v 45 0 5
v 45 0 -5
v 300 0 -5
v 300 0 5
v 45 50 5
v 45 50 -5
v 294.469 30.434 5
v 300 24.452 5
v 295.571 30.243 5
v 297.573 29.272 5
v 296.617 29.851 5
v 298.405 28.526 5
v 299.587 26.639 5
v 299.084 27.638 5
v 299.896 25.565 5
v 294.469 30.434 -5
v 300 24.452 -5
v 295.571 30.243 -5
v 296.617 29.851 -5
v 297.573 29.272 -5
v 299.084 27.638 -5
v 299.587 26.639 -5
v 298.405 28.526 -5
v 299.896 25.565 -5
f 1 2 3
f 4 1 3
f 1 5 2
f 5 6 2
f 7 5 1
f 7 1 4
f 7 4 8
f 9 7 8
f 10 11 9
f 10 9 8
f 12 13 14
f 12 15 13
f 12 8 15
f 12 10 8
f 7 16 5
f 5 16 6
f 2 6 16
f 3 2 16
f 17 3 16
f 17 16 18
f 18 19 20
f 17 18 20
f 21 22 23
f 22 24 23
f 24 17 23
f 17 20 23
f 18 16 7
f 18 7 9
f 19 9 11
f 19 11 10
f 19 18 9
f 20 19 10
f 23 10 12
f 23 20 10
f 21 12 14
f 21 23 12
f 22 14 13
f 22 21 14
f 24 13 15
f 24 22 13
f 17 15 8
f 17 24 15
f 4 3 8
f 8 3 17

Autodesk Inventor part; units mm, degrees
ref_plane "YZ Plane" through (0, 0, 0) normal (1, 0, 0) x (0, 1, 0)
ref_plane "XZ Plane" through (0, 0, 0) normal (0, 1, 0) x (-1, 0, 0)
ref_plane "XY Plane" through (0, 0, 0) normal (0, 0, 1) x (1, 0, 0)
sketch "Sketch3" plane through (0, 0, 0) normal (0, 0, 1) x (1, 0, 0)
  line L0 (0, 0) -> (300, 0)
  line L1 (300, 0) -> (300, 30)
  line L2 (300, 30) -> (-5.542, 53.9641)
  line L3 (45, 50) -> (45, 0)
  dimension "d11" = 300
  dimension "d12" = 30
  dimension "d13" = 45
  dimension "d14" = 50
extrude "Plate1" add sketch "Sketch3" along normal mid plane 10
fillet "Corner Round1" radius 6 1 edges at (300, 30, 0)
equation "\"d15\" = Thickness"
equation "\"BendReliefDepth\" = 0.5 * Thickness"
equation "\"Thickness\" = 10"
properties part number "PRS 1614 charging hatch reinf 500mm" material "Steel"
